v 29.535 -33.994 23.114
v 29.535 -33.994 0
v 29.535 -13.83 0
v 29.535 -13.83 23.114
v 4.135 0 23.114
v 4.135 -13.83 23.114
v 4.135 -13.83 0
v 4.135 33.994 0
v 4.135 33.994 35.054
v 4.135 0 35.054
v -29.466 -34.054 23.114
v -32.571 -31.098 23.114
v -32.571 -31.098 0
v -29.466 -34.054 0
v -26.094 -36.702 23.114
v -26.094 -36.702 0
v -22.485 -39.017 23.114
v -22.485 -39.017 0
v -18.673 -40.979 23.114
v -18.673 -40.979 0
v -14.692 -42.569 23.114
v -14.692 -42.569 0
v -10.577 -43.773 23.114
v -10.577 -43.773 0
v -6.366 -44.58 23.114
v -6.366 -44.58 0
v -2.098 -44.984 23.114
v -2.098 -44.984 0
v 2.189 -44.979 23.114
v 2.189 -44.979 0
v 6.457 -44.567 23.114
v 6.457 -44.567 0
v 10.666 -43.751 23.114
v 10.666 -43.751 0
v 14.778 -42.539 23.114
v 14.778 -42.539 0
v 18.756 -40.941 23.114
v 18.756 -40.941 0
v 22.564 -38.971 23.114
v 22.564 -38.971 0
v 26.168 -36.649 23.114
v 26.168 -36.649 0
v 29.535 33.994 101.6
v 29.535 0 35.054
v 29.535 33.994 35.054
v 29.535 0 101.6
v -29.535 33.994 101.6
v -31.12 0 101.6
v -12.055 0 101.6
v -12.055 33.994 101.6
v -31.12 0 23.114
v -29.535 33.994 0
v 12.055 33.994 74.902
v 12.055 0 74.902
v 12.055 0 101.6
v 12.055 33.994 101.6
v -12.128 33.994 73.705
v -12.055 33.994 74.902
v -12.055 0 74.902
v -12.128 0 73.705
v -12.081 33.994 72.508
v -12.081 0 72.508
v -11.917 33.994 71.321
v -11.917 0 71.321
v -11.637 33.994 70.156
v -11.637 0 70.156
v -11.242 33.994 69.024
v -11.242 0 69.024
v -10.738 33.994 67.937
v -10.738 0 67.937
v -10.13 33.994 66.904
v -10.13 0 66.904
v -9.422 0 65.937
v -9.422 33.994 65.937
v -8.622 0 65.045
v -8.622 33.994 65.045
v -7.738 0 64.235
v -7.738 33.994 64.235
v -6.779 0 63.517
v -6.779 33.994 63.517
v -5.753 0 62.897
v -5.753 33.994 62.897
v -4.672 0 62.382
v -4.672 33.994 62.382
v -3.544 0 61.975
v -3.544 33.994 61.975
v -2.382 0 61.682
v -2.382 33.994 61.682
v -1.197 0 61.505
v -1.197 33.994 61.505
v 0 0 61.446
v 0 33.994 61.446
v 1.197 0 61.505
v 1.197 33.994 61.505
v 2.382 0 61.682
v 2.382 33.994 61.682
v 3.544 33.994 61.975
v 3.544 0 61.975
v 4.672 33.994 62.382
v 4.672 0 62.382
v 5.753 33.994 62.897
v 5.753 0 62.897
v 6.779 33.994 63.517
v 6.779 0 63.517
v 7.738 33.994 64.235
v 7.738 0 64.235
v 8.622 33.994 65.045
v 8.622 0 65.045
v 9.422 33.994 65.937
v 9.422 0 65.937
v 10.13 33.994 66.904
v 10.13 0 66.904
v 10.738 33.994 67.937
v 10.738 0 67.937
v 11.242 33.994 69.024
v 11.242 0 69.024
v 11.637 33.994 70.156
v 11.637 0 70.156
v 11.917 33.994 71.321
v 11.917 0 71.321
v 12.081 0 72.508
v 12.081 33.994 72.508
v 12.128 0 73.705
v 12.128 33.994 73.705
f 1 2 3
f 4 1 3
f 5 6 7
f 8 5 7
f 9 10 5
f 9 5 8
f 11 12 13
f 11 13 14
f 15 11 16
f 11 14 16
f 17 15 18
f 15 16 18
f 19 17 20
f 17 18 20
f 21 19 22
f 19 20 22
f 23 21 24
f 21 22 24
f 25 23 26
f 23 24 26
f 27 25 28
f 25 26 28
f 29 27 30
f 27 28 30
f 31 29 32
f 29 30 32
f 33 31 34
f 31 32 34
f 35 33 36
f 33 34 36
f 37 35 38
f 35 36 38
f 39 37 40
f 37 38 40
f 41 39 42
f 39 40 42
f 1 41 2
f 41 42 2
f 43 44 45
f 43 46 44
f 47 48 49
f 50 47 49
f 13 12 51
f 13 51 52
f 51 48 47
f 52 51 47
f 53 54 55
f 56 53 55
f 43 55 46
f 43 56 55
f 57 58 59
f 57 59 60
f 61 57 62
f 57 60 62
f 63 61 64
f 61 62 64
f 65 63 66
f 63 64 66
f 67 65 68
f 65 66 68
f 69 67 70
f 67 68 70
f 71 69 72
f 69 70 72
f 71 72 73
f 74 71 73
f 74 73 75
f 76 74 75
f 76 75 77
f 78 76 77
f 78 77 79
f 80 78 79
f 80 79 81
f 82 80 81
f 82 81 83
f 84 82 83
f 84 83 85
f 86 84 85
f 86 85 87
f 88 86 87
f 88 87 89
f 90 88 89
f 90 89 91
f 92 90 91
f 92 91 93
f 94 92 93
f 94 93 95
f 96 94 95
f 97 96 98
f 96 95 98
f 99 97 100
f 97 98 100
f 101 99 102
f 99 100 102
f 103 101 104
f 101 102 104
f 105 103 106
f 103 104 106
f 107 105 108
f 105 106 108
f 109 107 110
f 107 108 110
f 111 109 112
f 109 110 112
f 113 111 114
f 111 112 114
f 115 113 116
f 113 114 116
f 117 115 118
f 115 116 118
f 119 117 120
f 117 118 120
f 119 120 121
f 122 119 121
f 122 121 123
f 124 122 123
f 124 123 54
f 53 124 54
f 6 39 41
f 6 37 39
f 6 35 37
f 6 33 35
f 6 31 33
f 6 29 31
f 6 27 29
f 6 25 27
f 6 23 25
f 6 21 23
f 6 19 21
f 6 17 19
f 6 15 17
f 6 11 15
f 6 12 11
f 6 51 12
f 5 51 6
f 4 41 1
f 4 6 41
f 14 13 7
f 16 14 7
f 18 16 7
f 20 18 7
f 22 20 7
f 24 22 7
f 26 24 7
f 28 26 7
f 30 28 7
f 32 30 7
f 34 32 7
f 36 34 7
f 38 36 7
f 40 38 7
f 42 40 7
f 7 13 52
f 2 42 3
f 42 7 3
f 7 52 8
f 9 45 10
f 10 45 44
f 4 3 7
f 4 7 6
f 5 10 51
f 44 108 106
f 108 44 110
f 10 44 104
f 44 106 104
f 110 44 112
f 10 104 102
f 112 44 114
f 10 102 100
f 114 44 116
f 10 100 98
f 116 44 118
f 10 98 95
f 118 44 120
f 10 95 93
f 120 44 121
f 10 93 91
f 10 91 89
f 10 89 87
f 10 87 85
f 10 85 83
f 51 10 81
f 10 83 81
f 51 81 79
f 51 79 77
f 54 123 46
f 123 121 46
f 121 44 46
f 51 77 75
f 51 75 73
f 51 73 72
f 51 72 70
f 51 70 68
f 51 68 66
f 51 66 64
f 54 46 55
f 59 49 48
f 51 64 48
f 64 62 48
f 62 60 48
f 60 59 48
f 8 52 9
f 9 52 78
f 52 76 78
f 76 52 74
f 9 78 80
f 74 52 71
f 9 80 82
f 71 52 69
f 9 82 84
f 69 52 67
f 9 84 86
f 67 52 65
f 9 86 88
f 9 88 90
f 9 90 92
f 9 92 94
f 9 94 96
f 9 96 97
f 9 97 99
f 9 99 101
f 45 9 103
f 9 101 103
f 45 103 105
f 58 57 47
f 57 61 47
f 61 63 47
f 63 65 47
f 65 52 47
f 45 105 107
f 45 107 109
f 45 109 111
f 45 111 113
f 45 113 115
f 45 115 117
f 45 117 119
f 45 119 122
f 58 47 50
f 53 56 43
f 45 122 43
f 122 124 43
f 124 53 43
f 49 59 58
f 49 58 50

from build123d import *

# Parameters (mm, degrees)
F0_R      = 45.0325126913
F1_DEPTH  = 101.6
F3_DEPTH  = 78.486
F5_DEPTH  = 107.188
F7_DEPTH  = 186.944
F8_R      = 12.1282777673
F9_DEPTH  = 81.026
F10_W     = 24.1107804074
F10_H     = 34.6709556208
F11_DEPTH = 128.778
F13_DEPTH = 25.4
F14_W     = 27.1864784881
F14_H     = 35.0537188351
F15_DEPTH = 25.4


with BuildPart() as f1:
    # F0 (on Top) → F1 (new body)
    with BuildSketch(Plane.XY):
        Circle(F0_R)
    extrude(amount=F1_DEPTH)

    # F2 (on face) → F3 (cut)
    with BuildSketch(Plane.XY.offset(101.6)):
        Polygon((45.0325126913, 0), (-45.0325126913, 0), (-69.5492550731, 0), (45.0325126913, -116.2401661277), (161.6928875446, -116.2401661277), align=None)
    extrude(amount=-F3_DEPTH, mode=Mode.SUBTRACT)

    # F4 (on face) → F5 (cut)
    with BuildSketch(Plane.XY.offset(101.6)):
        Polygon((-61.1385696894, -57.6286986393), (-33.8673712273, -58.9006000359), (-28.4030238845, 58.2620206293), (-55.6742223466, 59.5339220259), align=None)
    extrude(amount=-F5_DEPTH, mode=Mode.SUBTRACT)

    # F6 (on face) → F7 (cut)
    with BuildSketch(Plane.XY.offset(101.6)):
        Polygon((-29.5348406238, 53.1750321388), (-29.5348406238, 33.9944170212), (29.5348406238, 33.9944170212), (29.5348406238, -32.5324498117), (45.0325126913, -32.5324498117), (45.0325126913, 59.2755898833), align=None)
    extrude(amount=-F7_DEPTH, mode=Mode.SUBTRACT)

    # F8 (on face) → F9 (cut)
    with BuildSketch(Plane.XZ):
        with Locations((0, 73.5739916563)):
            Circle(F8_R)
    extrude(amount=-F9_DEPTH, mode=Mode.SUBTRACT)

    # F10 (on face) → F11 (cut)
    with BuildSketch(Plane.XZ):
        with Locations((0, 89.5818066187)):
            Rectangle(F10_W, F10_H)
    extrude(amount=-F11_DEPTH, mode=Mode.SUBTRACT)

    # F12 (on face) → F13 (cut)
    with BuildSketch(Plane.YZ.offset(29.5348406238)):
        Polygon((0, -13.3575685322), (-16.2662249058, 23.114), (-67.4354508519, 30.6860208511), (-70.5883606289, 9.3796937905), (-70.5883606289, -6.5510598943), align=None)
    extrude(amount=F13_DEPTH, mode=Mode.SUBTRACT)

    # F14 (on face) → F15 (cut)
    with BuildSketch(Plane.YZ.offset(29.5348406238)):
        with Locations((-0.2370146103, 17.5268594176)):
            Rectangle(F14_W, F14_H)
        Polygon((13.3562246338, 35.0537188351), (13.3562246338, 0), (19.999248907, 0), (53.7981726229, 0), (53.7981726229, 35.0537188351), align=None)
    extrude(amount=-F15_DEPTH, mode=Mode.SUBTRACT)


solid = f1.part
